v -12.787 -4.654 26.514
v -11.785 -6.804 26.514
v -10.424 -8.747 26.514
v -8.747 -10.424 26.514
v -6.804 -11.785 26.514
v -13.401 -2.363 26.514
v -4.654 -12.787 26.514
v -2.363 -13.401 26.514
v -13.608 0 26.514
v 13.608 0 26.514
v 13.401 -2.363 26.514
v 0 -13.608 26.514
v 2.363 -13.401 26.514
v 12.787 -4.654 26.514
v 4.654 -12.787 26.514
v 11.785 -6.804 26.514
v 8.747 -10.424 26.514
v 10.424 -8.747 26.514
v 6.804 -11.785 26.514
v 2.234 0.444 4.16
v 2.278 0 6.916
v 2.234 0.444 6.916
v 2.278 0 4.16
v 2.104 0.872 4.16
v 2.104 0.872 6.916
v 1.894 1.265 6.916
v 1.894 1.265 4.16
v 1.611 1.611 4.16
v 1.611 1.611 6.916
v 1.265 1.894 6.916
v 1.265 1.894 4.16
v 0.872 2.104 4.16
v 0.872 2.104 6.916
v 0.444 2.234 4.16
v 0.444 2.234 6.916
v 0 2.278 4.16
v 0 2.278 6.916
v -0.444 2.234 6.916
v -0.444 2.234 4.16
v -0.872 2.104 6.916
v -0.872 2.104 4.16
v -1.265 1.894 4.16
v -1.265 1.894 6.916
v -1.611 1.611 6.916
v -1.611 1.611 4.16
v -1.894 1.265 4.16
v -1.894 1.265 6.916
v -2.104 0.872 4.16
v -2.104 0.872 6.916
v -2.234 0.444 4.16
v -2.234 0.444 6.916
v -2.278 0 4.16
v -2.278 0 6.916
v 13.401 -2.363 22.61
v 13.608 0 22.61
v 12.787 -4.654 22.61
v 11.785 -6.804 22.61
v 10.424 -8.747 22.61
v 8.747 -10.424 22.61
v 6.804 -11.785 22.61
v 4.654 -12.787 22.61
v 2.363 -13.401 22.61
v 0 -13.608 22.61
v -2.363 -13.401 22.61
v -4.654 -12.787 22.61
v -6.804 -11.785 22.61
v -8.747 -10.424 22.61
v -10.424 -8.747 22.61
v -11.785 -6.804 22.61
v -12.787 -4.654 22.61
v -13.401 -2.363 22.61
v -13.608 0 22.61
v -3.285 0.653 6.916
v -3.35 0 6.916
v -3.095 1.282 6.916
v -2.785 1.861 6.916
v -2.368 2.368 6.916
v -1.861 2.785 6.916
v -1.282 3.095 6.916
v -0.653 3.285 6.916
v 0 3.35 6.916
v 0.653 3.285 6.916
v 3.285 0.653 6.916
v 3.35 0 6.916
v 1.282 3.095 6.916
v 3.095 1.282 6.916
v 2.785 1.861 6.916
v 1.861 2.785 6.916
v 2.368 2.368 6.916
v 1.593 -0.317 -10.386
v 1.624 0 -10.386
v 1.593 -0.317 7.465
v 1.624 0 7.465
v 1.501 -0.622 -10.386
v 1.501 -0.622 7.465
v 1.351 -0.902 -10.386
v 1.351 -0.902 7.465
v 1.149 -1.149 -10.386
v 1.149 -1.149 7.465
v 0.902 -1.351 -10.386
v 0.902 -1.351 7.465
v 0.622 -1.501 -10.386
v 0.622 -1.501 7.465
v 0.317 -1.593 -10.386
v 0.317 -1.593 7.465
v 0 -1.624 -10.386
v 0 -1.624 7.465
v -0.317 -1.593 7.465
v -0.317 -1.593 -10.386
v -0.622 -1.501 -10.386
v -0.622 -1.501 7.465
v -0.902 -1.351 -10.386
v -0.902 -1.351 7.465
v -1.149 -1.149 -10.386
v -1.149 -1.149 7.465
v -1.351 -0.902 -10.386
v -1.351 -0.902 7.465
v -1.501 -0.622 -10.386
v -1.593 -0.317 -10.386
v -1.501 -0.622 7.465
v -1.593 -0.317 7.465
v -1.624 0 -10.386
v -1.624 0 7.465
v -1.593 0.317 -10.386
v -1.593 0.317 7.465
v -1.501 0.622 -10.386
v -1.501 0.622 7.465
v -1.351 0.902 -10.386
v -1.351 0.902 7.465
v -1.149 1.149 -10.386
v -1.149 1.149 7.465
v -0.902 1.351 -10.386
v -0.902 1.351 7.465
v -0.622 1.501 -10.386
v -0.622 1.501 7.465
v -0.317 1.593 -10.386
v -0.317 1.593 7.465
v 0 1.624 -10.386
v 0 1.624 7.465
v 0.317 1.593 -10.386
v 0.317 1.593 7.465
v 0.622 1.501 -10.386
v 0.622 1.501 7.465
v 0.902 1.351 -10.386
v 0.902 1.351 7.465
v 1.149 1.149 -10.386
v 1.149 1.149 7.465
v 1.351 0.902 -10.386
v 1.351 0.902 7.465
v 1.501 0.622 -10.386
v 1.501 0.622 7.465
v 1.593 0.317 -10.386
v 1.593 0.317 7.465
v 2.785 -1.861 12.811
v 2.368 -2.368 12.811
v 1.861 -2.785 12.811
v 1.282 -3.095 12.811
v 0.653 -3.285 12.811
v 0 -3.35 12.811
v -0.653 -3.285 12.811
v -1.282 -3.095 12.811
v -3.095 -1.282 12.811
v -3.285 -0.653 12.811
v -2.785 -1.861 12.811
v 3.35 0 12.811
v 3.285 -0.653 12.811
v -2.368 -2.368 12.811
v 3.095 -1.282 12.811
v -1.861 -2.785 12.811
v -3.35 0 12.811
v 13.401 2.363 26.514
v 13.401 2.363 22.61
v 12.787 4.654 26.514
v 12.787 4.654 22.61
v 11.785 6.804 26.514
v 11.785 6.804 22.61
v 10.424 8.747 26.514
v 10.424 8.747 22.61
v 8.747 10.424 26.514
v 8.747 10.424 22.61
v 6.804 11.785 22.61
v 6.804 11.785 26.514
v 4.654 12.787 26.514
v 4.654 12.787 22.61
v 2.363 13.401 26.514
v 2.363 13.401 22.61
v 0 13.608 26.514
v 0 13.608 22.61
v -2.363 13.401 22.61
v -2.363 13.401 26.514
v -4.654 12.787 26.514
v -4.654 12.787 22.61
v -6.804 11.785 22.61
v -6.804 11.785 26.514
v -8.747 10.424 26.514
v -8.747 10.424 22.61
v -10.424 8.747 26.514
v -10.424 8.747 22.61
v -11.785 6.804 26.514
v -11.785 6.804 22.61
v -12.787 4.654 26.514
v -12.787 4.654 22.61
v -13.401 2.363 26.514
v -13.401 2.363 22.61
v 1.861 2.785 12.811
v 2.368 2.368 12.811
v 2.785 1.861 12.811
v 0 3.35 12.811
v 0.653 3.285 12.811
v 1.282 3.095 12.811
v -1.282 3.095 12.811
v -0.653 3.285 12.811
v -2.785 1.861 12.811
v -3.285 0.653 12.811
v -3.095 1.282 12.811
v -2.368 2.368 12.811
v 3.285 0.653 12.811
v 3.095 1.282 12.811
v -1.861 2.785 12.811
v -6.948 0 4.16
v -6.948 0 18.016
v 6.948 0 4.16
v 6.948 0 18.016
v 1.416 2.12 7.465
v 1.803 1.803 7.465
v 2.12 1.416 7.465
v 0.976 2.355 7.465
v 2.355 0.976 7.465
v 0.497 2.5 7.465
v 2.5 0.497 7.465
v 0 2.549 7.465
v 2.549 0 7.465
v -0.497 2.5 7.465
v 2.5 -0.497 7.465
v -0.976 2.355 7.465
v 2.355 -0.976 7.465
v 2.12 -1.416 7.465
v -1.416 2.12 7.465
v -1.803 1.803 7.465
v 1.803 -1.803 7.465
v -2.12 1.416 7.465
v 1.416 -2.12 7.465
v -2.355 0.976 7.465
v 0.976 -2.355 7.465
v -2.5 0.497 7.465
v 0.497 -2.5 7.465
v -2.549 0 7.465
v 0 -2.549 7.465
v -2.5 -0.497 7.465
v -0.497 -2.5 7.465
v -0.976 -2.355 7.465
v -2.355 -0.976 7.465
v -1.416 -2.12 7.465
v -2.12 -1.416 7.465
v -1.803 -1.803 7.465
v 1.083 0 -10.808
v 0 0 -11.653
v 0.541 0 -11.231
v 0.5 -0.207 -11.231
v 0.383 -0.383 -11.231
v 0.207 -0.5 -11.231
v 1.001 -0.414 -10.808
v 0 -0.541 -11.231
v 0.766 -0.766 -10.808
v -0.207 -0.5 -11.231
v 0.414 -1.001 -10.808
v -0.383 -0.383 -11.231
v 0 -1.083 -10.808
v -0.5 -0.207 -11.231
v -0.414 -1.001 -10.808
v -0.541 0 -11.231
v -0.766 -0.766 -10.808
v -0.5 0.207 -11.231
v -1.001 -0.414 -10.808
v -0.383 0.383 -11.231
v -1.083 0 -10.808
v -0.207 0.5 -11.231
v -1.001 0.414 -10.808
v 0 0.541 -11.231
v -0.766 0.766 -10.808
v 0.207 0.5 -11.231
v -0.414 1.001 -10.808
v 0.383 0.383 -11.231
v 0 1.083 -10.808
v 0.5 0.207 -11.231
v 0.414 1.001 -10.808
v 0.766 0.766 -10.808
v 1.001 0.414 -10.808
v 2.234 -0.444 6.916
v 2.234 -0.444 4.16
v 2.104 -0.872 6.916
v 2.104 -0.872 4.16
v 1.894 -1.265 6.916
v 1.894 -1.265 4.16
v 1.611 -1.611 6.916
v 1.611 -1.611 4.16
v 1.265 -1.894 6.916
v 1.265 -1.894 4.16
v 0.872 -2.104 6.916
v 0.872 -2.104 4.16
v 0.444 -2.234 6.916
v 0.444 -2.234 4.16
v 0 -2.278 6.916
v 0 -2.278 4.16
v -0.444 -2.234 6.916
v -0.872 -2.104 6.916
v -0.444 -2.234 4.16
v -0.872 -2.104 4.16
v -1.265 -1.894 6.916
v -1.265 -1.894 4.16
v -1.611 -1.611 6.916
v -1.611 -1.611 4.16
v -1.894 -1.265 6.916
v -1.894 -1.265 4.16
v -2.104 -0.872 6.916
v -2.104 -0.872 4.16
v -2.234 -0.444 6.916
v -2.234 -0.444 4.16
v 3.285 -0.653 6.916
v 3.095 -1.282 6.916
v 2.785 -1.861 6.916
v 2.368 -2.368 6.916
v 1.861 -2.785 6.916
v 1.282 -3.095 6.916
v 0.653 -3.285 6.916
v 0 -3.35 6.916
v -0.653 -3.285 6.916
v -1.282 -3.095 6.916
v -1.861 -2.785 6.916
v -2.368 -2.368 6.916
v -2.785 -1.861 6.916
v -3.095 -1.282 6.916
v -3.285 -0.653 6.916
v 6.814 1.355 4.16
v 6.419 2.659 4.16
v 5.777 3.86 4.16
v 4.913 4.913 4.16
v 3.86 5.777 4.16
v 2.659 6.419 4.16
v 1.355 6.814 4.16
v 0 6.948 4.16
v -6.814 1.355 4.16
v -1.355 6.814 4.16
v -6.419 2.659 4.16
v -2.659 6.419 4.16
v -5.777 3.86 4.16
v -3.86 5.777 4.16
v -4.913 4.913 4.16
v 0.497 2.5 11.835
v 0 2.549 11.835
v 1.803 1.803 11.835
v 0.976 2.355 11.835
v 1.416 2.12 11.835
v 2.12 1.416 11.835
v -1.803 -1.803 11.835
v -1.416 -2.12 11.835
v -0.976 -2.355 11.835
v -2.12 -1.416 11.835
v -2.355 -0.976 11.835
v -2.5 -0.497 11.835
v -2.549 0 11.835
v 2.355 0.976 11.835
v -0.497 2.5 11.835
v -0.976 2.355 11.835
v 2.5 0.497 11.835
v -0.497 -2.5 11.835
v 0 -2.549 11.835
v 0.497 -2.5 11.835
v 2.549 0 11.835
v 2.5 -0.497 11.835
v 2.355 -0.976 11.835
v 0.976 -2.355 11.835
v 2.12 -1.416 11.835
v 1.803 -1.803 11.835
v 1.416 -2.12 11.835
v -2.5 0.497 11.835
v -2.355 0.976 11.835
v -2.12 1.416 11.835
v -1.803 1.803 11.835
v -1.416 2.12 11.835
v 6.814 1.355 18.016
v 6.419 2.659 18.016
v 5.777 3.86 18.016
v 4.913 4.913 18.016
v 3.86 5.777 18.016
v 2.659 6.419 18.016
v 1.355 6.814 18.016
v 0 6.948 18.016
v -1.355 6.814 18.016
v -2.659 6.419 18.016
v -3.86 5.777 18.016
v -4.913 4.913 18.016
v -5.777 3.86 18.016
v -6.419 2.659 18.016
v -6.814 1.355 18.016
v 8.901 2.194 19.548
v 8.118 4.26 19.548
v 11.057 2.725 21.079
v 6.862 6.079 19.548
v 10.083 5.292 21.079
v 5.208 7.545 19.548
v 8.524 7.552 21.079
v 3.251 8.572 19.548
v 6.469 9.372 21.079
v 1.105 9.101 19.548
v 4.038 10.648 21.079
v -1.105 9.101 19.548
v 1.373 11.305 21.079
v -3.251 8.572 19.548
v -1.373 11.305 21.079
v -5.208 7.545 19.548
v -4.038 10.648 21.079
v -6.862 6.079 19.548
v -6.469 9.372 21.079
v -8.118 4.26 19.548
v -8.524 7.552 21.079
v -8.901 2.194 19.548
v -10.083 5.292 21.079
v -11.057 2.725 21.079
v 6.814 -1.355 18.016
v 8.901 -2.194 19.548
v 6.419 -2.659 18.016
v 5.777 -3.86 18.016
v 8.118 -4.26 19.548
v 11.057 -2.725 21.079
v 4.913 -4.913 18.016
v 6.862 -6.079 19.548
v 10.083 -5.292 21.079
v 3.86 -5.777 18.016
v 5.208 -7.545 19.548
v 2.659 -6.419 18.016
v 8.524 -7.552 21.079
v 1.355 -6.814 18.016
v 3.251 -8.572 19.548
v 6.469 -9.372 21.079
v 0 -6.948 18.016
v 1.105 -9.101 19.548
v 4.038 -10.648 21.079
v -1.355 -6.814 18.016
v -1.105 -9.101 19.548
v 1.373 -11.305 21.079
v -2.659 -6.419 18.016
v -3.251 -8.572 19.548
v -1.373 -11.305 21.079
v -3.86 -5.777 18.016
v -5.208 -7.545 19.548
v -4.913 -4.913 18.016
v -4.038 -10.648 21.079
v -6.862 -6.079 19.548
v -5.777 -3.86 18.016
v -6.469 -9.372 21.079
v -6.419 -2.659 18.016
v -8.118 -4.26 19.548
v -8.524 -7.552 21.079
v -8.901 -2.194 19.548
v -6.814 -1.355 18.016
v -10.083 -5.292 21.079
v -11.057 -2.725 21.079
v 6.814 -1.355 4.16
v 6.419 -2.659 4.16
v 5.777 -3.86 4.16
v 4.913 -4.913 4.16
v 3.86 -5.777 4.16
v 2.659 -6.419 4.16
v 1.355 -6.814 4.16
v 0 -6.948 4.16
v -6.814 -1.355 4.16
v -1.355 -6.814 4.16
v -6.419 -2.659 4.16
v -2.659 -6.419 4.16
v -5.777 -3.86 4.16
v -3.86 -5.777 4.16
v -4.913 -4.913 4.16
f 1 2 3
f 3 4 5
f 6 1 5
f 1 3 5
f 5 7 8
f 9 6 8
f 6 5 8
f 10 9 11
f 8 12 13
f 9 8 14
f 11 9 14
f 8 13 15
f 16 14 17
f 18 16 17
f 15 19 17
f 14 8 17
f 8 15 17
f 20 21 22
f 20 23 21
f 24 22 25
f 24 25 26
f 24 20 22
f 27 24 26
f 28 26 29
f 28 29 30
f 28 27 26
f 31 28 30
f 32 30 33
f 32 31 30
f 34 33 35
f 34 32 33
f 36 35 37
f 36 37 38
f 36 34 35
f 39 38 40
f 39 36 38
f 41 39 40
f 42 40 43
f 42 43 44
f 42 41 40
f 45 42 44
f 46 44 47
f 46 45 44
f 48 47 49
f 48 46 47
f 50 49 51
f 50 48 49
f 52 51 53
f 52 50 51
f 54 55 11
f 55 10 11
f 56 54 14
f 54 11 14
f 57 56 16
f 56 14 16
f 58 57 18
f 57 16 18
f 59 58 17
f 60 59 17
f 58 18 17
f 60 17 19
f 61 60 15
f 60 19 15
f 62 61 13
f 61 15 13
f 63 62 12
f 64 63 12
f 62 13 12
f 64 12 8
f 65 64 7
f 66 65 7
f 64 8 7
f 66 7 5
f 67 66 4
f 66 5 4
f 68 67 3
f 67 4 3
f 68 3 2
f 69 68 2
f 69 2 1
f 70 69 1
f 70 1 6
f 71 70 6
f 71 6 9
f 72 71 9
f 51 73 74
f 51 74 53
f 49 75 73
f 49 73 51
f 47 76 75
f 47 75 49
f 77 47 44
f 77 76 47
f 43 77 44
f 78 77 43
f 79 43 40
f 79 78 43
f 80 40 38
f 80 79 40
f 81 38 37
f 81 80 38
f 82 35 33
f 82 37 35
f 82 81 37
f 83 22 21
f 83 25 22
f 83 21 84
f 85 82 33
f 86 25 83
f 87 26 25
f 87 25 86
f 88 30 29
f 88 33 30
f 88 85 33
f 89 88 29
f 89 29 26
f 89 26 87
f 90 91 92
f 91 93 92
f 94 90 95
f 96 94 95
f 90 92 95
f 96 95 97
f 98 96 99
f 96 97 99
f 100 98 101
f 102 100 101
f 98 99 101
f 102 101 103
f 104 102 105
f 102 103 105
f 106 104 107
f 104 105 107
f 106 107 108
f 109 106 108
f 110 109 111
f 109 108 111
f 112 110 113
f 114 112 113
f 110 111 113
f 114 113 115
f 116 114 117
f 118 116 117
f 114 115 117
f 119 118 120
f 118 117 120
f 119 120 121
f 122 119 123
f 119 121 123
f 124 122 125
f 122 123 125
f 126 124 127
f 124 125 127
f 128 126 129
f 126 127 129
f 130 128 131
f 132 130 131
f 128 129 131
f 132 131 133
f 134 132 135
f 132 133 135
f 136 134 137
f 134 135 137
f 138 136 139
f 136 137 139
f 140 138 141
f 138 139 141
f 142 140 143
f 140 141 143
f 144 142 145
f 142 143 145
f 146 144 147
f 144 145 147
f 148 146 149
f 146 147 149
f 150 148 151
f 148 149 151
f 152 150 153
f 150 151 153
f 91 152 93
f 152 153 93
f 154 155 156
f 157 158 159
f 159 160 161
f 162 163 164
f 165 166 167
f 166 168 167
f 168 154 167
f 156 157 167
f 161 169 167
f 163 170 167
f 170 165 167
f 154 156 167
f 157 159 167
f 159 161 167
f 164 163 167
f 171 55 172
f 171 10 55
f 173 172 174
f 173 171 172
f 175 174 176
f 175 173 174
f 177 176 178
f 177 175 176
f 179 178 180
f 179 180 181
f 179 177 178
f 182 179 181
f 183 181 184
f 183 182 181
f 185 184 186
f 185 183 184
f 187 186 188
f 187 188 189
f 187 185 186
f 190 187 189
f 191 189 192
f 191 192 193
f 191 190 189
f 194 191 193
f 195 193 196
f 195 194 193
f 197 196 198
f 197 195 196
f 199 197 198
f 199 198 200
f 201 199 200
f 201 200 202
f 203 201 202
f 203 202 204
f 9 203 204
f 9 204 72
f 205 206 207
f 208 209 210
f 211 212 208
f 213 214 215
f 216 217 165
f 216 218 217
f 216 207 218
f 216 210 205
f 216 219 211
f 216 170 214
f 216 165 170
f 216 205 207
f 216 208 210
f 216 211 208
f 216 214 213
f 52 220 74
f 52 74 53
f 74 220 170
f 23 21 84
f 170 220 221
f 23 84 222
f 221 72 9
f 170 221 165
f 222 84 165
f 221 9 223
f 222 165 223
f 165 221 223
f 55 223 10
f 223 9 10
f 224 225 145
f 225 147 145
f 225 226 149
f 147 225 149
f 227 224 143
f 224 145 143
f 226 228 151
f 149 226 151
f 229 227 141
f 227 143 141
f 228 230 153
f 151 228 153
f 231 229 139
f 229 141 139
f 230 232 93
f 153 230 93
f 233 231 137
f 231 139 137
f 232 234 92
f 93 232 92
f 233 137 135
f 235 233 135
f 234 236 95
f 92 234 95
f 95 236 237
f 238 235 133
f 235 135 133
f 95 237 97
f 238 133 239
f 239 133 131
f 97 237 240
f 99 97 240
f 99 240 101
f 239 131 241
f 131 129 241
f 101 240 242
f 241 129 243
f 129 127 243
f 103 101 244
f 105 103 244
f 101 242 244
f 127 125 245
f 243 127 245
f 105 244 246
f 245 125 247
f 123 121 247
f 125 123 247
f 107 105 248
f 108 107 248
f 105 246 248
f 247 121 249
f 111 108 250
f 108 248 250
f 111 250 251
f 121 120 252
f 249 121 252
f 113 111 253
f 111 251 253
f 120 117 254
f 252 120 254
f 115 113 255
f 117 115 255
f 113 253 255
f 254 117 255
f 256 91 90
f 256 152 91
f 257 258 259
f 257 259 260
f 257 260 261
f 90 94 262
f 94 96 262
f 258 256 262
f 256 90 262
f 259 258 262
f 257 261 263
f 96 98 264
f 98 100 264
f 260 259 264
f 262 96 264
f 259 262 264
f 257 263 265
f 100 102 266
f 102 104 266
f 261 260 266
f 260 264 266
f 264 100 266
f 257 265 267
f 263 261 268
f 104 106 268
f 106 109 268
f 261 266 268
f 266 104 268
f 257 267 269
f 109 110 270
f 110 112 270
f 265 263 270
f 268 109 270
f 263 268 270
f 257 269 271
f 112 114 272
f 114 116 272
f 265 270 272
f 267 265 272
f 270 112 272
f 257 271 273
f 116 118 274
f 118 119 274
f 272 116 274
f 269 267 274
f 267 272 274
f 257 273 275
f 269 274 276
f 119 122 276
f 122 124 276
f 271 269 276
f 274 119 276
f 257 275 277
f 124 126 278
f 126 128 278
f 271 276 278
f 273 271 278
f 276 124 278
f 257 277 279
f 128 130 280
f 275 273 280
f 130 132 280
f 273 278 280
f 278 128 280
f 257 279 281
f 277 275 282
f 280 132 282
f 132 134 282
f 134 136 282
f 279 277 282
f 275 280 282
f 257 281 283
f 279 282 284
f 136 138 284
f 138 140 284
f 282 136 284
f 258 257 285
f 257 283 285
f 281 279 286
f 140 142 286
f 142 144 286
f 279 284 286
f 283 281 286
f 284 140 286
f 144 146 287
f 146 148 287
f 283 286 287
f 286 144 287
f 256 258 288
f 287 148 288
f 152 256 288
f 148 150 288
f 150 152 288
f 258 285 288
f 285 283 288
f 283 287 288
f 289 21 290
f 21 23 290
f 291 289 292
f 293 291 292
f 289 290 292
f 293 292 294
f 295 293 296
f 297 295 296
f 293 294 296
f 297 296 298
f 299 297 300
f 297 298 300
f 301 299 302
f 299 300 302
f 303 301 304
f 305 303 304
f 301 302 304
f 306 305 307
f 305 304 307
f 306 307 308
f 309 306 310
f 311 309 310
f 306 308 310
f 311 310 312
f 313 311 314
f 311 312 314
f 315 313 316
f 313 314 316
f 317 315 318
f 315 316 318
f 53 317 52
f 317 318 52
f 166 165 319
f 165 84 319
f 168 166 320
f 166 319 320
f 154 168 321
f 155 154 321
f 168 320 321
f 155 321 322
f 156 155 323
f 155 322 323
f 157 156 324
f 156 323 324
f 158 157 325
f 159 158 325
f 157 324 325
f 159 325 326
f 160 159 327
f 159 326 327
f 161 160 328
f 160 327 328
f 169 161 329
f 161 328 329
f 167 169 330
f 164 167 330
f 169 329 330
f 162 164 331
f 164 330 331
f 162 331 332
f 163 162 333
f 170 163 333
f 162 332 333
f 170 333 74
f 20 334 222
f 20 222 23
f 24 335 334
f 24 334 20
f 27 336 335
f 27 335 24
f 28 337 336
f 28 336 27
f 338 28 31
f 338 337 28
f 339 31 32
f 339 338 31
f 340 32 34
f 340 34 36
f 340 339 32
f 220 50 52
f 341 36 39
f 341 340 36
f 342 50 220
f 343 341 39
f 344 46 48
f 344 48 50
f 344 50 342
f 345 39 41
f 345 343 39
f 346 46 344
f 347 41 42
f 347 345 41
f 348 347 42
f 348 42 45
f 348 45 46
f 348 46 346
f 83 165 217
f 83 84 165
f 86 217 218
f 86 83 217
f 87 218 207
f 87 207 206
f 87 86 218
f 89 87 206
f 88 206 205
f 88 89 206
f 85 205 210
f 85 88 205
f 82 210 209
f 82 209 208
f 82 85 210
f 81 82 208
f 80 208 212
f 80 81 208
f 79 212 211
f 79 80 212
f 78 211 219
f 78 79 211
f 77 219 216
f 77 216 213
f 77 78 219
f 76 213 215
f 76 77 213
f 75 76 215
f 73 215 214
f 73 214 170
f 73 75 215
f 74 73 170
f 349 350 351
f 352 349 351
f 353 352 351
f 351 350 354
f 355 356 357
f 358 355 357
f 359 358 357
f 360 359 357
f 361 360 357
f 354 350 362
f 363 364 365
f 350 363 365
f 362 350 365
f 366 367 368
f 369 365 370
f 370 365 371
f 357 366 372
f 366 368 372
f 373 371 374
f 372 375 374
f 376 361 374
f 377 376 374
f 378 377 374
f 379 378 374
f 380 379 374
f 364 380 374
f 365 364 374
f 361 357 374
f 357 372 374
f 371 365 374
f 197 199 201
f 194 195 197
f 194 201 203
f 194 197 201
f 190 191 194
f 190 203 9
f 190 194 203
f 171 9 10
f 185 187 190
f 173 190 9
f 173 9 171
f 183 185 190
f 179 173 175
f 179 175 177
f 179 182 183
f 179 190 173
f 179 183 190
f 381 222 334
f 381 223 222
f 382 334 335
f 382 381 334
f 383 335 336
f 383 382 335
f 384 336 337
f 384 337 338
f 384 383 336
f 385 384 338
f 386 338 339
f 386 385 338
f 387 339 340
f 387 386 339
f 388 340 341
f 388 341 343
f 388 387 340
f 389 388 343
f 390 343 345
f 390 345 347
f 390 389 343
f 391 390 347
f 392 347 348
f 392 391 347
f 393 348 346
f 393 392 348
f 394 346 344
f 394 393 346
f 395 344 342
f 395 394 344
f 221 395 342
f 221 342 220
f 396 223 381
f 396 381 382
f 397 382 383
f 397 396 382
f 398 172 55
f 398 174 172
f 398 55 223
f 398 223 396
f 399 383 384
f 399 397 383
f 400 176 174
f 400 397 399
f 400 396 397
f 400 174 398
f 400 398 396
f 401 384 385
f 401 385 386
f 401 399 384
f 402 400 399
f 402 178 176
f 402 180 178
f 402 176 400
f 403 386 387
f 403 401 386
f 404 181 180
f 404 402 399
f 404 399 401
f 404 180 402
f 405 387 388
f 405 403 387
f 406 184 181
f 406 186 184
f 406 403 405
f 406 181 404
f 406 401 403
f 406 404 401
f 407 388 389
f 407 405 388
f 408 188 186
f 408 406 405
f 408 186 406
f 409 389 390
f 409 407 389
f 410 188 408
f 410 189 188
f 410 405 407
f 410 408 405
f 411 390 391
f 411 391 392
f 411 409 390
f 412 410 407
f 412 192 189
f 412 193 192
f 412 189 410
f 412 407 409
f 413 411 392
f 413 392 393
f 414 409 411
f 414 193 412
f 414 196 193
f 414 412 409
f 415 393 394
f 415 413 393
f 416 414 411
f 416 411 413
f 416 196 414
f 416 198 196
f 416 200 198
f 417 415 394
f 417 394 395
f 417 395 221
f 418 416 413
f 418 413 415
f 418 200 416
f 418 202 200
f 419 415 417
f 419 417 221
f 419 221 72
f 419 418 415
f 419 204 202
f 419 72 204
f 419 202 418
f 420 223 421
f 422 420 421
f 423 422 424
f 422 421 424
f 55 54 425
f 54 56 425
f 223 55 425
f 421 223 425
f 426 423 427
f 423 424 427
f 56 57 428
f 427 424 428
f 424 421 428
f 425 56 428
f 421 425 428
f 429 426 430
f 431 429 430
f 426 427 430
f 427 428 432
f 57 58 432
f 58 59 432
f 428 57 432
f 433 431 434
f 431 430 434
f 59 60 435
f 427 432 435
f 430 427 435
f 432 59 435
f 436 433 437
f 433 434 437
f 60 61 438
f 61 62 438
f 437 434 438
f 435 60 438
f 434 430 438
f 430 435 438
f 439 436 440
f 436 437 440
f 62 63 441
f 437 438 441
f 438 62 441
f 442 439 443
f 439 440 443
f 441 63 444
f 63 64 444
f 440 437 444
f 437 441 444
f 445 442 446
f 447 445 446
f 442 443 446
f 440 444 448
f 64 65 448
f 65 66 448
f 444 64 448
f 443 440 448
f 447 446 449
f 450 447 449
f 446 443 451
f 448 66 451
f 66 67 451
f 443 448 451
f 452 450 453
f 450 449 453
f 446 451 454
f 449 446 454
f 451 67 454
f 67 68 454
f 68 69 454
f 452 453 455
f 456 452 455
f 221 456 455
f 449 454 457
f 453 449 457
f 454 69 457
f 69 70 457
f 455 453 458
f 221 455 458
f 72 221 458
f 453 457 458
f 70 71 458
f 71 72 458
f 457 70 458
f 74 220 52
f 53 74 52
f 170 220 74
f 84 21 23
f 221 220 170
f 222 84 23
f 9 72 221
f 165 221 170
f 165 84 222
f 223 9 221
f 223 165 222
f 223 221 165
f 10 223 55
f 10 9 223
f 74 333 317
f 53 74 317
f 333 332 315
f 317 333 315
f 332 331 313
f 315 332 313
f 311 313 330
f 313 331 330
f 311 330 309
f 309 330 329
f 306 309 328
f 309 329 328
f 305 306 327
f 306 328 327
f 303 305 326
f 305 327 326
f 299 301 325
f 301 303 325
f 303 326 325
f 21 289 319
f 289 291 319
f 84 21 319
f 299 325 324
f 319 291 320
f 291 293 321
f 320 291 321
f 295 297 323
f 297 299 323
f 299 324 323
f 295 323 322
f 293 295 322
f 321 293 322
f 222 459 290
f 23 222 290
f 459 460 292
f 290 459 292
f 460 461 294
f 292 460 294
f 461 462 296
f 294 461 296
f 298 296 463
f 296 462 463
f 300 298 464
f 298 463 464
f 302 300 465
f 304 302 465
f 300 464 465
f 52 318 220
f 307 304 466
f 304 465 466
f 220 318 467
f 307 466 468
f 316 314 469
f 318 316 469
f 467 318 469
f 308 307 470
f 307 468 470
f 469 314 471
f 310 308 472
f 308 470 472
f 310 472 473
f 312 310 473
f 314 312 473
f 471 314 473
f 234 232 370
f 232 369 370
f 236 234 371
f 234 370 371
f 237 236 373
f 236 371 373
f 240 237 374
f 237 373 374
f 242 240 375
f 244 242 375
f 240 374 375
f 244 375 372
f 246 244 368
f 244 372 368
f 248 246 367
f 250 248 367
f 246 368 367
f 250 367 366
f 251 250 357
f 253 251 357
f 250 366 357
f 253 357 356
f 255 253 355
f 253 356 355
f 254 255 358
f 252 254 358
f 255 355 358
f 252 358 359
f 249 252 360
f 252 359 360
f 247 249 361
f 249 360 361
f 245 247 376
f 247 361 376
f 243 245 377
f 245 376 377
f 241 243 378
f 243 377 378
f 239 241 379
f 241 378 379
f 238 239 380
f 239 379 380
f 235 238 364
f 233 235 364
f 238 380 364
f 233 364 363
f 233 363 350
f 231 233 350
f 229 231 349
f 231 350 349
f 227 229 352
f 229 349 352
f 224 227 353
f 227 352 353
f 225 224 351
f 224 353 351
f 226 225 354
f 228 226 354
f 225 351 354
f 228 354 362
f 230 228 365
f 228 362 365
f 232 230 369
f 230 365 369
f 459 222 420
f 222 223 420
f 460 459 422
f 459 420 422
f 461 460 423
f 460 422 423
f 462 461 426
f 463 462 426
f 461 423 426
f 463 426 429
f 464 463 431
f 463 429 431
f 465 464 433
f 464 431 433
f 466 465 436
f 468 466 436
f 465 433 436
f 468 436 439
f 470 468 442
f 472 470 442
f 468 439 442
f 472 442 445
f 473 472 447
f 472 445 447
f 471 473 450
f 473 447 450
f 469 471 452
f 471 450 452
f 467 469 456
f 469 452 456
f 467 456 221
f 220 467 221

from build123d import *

# Parameters (mm, degrees)
F2_ANGLE = 180
F3_ANGLE = -180


with BuildPart() as f1:
    # F0 (on Front) → F1 (revolve)
    with BuildSketch(Plane.XZ):
        Polygon((0, 11.83526), (0, -11.653179), (1.624448, -10.385728), (1.624448, 7.465318), (2.549133, 7.465318), (2.549133, 11.83526), align=None)
    revolve(axis=Axis((0, 0, 4.426354), (0, 0, -1)))


with BuildPart() as f2:
    # F0 (on Front) → F2 (revolve)
    with BuildSketch(Plane.XZ):
        Polygon((13.607997, 26.514072), (0, 26.514072), (0, 12.810619), (3.349548, 12.810619), (3.349548, 6.915838), (2.277769, 6.915838), (2.277769, 4.159836), (6.947661, 4.159836), (6.947661, 18.0164), (13.607997, 22.609735), align=None)
    revolve(axis=Axis((0, 0, 4.426354), (0, 0, -1)), revolution_arc=F2_ANGLE)


with BuildPart() as f3:
    # F0 (on Front) → F3 (revolve)
    with BuildSketch(Plane.XZ):
        Polygon((13.607997, 26.514072), (0, 26.514072), (0, 12.810619), (3.349548, 12.810619), (3.349548, 6.915838), (2.277769, 6.915838), (2.277769, 4.159836), (6.947661, 4.159836), (6.947661, 18.0164), (13.607997, 22.609735), align=None)
    revolve(axis=Axis((0, 0, 4.426354), (0, 0, -1)), revolution_arc=F3_ANGLE)


solid = Compound([f1.part, f2.part, f3.part])
